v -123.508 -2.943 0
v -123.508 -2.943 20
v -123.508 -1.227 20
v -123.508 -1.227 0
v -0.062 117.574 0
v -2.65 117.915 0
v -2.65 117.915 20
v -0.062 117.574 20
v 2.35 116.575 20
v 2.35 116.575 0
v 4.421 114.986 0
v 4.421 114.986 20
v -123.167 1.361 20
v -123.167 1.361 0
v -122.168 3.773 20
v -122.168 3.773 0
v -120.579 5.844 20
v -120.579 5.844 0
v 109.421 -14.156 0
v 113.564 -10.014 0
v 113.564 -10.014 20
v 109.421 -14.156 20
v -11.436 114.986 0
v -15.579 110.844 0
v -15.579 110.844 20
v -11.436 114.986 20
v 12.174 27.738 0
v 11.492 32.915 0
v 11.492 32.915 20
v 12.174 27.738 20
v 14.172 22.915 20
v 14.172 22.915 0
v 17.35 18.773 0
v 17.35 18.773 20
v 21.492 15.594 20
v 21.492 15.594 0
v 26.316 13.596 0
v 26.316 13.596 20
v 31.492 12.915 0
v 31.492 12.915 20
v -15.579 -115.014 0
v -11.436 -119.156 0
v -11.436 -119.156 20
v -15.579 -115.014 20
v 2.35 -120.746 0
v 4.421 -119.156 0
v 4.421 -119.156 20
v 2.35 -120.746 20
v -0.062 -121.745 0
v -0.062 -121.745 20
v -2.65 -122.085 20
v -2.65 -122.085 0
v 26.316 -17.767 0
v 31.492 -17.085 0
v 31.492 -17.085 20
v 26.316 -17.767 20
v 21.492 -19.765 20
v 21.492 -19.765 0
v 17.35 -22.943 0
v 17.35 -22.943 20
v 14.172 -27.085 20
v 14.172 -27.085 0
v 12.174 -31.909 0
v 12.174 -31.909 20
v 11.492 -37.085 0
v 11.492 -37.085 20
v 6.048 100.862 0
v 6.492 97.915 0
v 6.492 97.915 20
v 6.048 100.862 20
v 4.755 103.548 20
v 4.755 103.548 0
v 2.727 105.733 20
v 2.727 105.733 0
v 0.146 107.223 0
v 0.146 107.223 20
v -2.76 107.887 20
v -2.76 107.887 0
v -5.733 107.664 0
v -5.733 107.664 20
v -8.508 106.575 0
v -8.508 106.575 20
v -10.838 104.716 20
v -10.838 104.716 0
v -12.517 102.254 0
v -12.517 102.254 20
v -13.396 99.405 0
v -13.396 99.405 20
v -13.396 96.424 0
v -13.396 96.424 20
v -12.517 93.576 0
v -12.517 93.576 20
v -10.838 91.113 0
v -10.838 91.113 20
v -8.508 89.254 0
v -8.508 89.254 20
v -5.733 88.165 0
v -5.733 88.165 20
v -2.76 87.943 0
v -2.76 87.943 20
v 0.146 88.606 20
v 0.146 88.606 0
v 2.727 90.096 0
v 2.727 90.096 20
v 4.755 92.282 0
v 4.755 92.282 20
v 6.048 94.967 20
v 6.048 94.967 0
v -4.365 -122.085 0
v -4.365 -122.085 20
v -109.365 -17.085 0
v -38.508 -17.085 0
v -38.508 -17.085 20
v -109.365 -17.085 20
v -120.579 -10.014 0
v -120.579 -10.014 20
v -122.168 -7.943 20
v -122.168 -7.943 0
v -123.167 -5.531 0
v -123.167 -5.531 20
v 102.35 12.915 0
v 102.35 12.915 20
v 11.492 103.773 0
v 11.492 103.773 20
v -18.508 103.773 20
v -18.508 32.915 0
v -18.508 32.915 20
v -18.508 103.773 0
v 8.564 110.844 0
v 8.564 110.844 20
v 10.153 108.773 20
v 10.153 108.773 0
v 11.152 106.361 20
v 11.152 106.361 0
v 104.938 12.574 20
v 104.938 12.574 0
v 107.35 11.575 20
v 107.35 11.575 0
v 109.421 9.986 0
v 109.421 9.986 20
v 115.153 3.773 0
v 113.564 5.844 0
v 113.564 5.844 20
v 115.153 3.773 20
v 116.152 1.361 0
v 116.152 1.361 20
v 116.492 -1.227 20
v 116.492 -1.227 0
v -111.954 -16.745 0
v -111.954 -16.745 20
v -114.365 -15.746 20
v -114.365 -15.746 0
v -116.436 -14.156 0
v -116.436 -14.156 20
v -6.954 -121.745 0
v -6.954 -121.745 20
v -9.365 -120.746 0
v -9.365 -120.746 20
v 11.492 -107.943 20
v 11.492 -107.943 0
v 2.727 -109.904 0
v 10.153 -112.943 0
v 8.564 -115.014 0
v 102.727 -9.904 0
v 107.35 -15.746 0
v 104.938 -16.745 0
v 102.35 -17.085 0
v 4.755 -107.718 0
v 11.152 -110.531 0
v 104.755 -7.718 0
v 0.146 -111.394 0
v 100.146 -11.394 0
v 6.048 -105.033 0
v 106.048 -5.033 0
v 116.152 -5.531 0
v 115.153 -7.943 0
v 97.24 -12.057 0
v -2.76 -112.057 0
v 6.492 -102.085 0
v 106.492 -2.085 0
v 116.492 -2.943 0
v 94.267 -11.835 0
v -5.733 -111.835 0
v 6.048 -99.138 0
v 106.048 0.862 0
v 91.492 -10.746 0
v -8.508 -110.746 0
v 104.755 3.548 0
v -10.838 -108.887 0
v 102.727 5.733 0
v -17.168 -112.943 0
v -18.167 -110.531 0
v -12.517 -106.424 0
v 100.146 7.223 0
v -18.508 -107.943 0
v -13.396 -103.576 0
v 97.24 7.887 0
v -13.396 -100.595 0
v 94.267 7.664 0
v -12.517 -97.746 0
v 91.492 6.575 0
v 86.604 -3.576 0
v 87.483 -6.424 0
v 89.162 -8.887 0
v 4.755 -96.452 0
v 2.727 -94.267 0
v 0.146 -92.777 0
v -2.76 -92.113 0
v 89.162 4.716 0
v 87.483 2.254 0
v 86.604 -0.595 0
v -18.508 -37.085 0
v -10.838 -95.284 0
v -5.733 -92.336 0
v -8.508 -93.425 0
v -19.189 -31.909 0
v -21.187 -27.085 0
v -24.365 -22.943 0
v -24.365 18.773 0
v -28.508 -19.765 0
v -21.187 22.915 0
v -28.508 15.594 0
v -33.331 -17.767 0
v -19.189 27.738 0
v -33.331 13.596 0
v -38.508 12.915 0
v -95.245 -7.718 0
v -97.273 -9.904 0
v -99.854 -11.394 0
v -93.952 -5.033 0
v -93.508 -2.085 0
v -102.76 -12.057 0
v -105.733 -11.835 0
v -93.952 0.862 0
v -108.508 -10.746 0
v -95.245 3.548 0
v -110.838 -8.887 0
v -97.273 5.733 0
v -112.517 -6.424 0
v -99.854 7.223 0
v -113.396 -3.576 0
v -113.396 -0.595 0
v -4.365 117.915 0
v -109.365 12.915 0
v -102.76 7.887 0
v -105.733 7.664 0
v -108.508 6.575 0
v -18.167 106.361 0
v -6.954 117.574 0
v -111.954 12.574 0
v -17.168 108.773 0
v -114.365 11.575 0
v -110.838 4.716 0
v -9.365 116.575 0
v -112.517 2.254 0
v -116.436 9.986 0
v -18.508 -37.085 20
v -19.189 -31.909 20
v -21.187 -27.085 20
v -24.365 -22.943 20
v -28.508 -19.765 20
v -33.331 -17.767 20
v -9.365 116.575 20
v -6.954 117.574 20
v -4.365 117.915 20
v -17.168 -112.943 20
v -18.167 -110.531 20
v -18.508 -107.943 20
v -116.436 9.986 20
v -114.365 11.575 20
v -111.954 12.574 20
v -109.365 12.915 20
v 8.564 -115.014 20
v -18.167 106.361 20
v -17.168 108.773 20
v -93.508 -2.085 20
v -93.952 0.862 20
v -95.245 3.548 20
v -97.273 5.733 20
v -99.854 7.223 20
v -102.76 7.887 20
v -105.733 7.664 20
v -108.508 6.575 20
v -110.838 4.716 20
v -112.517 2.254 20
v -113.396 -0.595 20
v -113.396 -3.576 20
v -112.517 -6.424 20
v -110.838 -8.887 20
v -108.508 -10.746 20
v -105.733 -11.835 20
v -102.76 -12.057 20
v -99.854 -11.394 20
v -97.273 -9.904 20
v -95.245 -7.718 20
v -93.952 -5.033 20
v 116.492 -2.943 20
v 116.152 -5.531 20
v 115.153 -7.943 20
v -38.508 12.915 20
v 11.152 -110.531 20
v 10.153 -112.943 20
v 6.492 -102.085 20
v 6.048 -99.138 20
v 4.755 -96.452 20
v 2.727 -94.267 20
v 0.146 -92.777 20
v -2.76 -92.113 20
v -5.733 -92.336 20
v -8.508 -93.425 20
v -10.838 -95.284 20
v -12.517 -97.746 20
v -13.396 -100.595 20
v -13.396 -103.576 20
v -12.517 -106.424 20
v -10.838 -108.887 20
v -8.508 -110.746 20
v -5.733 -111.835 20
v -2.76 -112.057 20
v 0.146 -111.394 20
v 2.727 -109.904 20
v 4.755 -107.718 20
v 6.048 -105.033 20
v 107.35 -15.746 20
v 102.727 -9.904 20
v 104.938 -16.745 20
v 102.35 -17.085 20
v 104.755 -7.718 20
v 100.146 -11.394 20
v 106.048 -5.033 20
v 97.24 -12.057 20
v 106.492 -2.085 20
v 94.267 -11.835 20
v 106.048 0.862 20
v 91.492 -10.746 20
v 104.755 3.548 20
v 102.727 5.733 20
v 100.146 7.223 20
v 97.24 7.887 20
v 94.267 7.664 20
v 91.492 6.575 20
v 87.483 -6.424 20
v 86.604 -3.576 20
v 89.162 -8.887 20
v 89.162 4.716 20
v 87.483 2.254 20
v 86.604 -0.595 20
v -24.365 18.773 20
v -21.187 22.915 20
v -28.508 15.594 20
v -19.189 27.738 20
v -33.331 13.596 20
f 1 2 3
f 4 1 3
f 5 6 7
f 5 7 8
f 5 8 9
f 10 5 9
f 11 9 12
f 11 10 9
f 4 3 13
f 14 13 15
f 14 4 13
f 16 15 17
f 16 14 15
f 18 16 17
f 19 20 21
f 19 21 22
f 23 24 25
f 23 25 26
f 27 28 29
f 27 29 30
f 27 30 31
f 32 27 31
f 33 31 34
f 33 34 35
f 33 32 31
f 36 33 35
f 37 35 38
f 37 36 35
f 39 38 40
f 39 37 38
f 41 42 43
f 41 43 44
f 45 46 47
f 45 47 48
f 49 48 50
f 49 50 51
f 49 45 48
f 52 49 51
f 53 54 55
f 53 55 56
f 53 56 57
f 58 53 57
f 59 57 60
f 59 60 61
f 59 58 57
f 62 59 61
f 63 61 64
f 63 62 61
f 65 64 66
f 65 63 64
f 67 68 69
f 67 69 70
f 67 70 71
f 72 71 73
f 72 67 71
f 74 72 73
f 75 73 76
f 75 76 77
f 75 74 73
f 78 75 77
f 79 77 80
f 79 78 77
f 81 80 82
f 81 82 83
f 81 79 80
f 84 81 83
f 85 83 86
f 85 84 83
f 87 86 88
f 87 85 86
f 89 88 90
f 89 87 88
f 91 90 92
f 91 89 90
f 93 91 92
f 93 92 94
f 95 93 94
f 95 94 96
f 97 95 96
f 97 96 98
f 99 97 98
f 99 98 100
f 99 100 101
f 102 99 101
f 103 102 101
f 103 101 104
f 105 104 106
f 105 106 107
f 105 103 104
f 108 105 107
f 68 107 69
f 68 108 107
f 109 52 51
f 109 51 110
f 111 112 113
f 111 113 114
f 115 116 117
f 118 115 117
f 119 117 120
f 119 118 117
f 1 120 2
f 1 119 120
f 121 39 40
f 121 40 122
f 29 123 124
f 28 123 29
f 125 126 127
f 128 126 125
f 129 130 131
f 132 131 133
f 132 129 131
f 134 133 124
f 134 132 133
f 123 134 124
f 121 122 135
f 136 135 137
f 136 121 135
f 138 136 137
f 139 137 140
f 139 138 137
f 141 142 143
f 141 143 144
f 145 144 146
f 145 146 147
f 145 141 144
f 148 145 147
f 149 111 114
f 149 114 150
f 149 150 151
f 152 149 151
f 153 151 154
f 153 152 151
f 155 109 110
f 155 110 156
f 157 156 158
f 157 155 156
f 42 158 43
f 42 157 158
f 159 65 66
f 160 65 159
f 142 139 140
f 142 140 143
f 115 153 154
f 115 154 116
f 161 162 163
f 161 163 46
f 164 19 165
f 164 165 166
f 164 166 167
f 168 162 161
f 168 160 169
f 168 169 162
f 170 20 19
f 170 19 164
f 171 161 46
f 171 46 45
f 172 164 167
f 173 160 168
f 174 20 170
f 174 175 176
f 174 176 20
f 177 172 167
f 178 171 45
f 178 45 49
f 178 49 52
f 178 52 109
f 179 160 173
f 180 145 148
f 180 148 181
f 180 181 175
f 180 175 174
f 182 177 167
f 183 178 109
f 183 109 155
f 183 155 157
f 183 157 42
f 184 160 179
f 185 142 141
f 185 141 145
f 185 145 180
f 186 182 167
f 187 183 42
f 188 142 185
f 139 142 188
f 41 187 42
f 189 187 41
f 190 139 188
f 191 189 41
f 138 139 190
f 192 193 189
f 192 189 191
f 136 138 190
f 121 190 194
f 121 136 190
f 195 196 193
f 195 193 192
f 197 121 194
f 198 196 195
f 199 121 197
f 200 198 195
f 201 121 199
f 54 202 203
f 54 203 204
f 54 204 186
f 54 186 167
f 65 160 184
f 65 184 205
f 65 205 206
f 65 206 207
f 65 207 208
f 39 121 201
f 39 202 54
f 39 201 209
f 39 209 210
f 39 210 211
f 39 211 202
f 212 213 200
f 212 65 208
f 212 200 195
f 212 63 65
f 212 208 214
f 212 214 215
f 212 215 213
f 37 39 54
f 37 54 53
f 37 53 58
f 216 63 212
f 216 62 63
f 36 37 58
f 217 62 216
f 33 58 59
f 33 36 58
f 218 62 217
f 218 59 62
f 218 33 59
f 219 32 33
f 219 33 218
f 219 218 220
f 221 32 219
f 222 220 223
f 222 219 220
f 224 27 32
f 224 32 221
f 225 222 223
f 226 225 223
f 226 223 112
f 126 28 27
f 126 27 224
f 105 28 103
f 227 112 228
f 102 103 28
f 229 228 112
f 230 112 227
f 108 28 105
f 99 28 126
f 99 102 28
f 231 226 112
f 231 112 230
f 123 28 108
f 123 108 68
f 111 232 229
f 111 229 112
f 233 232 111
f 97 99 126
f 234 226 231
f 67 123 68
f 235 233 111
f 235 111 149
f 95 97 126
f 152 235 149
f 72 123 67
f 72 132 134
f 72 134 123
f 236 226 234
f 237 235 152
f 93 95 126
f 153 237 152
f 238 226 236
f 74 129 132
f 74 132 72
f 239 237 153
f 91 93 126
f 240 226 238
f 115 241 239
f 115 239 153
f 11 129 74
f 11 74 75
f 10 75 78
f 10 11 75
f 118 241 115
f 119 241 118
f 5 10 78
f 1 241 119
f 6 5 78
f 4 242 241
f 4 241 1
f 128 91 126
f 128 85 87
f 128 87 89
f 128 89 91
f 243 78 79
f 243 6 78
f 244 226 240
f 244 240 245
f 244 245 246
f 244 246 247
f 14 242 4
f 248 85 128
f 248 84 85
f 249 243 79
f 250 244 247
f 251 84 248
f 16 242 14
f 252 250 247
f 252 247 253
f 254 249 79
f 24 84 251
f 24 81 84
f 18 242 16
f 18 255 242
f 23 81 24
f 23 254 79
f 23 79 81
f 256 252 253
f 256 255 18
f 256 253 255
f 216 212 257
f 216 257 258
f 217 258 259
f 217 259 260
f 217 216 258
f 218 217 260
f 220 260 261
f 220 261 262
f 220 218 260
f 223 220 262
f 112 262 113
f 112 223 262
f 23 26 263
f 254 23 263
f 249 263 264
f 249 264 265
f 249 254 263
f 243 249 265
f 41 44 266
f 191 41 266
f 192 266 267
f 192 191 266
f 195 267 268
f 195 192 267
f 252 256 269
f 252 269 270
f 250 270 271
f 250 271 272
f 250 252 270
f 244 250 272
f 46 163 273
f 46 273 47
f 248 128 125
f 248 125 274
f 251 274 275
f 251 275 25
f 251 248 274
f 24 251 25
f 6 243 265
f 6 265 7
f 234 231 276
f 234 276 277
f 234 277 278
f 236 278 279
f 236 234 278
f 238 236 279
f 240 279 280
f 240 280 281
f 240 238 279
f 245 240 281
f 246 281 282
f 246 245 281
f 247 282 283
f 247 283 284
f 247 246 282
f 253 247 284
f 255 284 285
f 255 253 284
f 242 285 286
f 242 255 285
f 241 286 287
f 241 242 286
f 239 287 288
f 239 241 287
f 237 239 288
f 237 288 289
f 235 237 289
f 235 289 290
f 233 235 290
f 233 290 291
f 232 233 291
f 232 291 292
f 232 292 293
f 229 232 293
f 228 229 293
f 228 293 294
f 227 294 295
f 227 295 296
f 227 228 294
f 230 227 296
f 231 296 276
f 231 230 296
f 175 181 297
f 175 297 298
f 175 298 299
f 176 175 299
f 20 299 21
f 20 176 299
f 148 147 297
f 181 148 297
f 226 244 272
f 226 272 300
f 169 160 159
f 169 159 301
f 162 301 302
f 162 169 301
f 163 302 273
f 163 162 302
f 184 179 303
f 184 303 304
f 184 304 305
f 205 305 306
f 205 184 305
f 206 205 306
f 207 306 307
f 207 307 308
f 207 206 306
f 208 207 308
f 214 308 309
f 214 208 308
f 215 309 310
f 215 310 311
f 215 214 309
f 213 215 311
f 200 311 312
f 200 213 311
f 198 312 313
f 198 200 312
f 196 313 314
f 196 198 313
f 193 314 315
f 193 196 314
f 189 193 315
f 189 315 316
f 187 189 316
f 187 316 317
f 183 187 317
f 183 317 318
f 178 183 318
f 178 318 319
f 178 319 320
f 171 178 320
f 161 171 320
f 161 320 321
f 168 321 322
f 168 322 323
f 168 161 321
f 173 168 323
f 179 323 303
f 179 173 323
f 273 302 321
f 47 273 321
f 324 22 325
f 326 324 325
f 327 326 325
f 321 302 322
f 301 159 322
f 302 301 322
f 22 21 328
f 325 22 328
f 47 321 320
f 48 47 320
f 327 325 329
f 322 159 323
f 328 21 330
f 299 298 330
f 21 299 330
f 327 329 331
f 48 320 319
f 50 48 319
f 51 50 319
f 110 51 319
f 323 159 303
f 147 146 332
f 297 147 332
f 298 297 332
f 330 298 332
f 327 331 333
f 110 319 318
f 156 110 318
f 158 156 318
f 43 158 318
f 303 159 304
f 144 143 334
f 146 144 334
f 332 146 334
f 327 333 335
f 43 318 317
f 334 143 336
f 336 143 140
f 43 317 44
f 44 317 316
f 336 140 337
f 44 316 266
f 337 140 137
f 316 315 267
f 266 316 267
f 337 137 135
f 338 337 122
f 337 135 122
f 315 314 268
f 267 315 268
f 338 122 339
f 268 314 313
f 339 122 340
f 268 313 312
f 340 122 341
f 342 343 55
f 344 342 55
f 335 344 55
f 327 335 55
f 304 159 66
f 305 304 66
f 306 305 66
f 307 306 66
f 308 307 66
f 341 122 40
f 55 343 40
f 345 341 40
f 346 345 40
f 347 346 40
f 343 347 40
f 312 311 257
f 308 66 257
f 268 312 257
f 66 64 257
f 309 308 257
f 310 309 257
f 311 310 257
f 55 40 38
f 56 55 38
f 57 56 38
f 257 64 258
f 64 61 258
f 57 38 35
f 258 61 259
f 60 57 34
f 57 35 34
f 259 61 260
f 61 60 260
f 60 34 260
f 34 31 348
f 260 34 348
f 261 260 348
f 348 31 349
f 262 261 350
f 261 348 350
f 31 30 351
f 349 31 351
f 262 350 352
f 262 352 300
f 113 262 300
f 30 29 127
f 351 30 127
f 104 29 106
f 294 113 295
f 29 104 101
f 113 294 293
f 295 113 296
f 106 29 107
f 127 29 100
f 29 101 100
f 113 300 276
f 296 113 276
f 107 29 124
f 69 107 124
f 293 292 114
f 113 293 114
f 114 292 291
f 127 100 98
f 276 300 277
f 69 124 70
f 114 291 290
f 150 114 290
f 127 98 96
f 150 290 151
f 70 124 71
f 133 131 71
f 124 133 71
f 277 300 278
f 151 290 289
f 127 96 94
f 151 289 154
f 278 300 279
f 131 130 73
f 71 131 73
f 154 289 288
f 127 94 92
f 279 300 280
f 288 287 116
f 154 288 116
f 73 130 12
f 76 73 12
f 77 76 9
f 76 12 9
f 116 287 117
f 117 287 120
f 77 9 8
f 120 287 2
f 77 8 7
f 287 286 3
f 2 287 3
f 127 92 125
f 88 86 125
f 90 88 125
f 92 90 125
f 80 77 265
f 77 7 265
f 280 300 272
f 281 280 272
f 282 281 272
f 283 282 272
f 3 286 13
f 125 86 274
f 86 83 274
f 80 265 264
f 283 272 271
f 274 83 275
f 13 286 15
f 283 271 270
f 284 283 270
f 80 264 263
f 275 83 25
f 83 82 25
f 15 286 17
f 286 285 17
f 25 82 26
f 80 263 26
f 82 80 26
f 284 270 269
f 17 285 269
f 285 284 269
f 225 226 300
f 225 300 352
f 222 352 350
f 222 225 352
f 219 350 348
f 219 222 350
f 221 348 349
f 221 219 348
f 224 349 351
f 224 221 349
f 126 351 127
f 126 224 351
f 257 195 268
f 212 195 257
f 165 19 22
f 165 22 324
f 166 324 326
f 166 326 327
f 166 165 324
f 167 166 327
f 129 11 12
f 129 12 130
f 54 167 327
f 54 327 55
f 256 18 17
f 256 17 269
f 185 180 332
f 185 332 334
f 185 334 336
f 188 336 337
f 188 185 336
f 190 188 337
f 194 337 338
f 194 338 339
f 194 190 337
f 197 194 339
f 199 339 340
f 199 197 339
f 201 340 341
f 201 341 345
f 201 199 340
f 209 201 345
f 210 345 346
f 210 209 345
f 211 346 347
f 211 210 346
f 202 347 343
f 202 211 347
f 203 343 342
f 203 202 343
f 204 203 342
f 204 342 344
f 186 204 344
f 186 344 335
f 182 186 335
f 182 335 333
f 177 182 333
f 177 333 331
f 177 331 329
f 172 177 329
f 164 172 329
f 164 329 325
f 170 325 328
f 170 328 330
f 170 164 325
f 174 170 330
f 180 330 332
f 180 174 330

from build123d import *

# Parameters (mm, degrees)
SKETCH_1_R      = 10
EXTRUDE_3_DEPTH = 20


with BuildPart() as part:
    # Эскиз1 → Бобышка-Вытянуть3 (new body)
    with BuildSketch(Plane.XY):
        with BuildLine():
            Line((-15.578628424, 110.843660763), (-11.436492801, 114.985796387))
            ThreePointArc((-11.436492801, 114.985796387), (-8.192259312, 117.1535239), (-4.365424989, 117.914728575))
            Line((-4.365424989, 117.914728575), (-2.649696236, 117.914728575))
            ThreePointArc((-2.649696236, 117.914728575), (1.177138088, 117.1535239), (4.421371576, 114.985796387))
            Line((4.421371576, 114.985796387), (8.563507199, 110.843660763))
            ThreePointArc((8.563507199, 110.843660763), (10.731234713, 107.599427275), (11.492439388, 103.772592951))
            Line((11.492439388, 103.772592951), (11.492439388, 32.914728575))
            ThreePointArc((11.492439388, 32.914728575), (17.350303764, 18.772592951), (31.492439388, 12.914728575))
            Line((31.492439388, 12.914728575), (102.350303764, 12.914728575))
            ThreePointArc((102.350303764, 12.914728575), (106.177138088, 12.1535239), (109.421371576, 9.985796387))
            Line((109.421371576, 9.985796387), (113.563507199, 5.843660763))
            ThreePointArc((113.563507199, 5.843660763), (115.731234713, 2.599427275), (116.492439388, -1.227407049))
            Line((116.492439388, -1.227407049), (116.492439388, -2.943135801))
            ThreePointArc((116.492439388, -2.943135801), (115.731234713, -6.769970125), (113.563507199, -10.014203613))
            Line((113.563507199, -10.014203613), (109.421371576, -14.156339237))
            ThreePointArc((109.421371576, -14.156339237), (106.177138088, -16.32406675), (102.350303764, -17.085271425))
            Line((102.350303764, -17.085271425), (31.492439388, -17.085271425))
            ThreePointArc((31.492439388, -17.085271425), (17.350303764, -22.943135801), (11.492439388, -37.085271425))
            Line((11.492439388, -37.085271425), (11.492439388, -107.943135801))
            ThreePointArc((11.492439388, -107.943135801), (10.731234713, -111.769970125), (8.563507199, -115.014203613))
            Line((8.563507199, -115.014203613), (4.421371576, -119.156339237))
            ThreePointArc((4.421371576, -119.156339237), (1.177138088, -121.32406675), (-2.649696236, -122.085271425))
            Line((-2.649696236, -122.085271425), (-4.365424989, -122.085271425))
            ThreePointArc((-4.365424989, -122.085271425), (-8.192259312, -121.32406675), (-11.436492801, -119.156339237))
            Line((-11.436492801, -119.156339237), (-15.578628424, -115.014203613))
            ThreePointArc((-15.578628424, -115.014203613), (-17.746355937, -111.769970125), (-18.507560612, -107.943135801))
            Line((-18.507560612, -107.943135801), (-18.507560612, -37.085271425))
            ThreePointArc((-18.507560612, -37.085271425), (-24.365424989, -22.943135801), (-38.507560612, -17.085271425))
            Line((-38.507560612, -17.085271425), (-109.365424989, -17.085271425))
            ThreePointArc((-109.365424989, -17.085271425), (-113.192259312, -16.32406675), (-116.436492801, -14.156339237))
            Line((-116.436492801, -14.156339237), (-120.578628424, -10.014203613))
            ThreePointArc((-120.578628424, -10.014203613), (-122.746355937, -6.769970125), (-123.507560612, -2.943135801))
            Line((-123.507560612, -2.943135801), (-123.507560612, -1.227407049))
            ThreePointArc((-123.507560612, -1.227407049), (-122.746355937, 2.599427275), (-120.578628424, 5.843660763))
            Line((-120.578628424, 5.843660763), (-116.436492801, 9.985796387))
            ThreePointArc((-116.436492801, 9.985796387), (-113.192259312, 12.1535239), (-109.365424989, 12.914728575))
            Line((-109.365424989, 12.914728575), (-38.507560612, 12.914728575))
            ThreePointArc((-38.507560612, 12.914728575), (-24.365424989, 18.772592951), (-18.507560612, 32.914728575))
            Line((-18.507560612, 32.914728575), (-18.507560612, 103.772592951))
            ThreePointArc((-18.507560612, 103.772592951), (-17.746355937, 107.599427275), (-15.578628424, 110.843660763))
        make_face()
        with Locations((-103.507560612, -2.085271425)):
            Circle(SKETCH_1_R, mode=Mode.SUBTRACT)
        with Locations((-3.507560612, 97.914728575)):
            Circle(SKETCH_1_R, mode=Mode.SUBTRACT)
        with Locations((96.492439388, -2.085271425)):
            Circle(SKETCH_1_R, mode=Mode.SUBTRACT)
        with Locations((-3.507560612, -102.085271425)):
            Circle(SKETCH_1_R, mode=Mode.SUBTRACT)
    extrude(amount=EXTRUDE_3_DEPTH)


solid = part.part
